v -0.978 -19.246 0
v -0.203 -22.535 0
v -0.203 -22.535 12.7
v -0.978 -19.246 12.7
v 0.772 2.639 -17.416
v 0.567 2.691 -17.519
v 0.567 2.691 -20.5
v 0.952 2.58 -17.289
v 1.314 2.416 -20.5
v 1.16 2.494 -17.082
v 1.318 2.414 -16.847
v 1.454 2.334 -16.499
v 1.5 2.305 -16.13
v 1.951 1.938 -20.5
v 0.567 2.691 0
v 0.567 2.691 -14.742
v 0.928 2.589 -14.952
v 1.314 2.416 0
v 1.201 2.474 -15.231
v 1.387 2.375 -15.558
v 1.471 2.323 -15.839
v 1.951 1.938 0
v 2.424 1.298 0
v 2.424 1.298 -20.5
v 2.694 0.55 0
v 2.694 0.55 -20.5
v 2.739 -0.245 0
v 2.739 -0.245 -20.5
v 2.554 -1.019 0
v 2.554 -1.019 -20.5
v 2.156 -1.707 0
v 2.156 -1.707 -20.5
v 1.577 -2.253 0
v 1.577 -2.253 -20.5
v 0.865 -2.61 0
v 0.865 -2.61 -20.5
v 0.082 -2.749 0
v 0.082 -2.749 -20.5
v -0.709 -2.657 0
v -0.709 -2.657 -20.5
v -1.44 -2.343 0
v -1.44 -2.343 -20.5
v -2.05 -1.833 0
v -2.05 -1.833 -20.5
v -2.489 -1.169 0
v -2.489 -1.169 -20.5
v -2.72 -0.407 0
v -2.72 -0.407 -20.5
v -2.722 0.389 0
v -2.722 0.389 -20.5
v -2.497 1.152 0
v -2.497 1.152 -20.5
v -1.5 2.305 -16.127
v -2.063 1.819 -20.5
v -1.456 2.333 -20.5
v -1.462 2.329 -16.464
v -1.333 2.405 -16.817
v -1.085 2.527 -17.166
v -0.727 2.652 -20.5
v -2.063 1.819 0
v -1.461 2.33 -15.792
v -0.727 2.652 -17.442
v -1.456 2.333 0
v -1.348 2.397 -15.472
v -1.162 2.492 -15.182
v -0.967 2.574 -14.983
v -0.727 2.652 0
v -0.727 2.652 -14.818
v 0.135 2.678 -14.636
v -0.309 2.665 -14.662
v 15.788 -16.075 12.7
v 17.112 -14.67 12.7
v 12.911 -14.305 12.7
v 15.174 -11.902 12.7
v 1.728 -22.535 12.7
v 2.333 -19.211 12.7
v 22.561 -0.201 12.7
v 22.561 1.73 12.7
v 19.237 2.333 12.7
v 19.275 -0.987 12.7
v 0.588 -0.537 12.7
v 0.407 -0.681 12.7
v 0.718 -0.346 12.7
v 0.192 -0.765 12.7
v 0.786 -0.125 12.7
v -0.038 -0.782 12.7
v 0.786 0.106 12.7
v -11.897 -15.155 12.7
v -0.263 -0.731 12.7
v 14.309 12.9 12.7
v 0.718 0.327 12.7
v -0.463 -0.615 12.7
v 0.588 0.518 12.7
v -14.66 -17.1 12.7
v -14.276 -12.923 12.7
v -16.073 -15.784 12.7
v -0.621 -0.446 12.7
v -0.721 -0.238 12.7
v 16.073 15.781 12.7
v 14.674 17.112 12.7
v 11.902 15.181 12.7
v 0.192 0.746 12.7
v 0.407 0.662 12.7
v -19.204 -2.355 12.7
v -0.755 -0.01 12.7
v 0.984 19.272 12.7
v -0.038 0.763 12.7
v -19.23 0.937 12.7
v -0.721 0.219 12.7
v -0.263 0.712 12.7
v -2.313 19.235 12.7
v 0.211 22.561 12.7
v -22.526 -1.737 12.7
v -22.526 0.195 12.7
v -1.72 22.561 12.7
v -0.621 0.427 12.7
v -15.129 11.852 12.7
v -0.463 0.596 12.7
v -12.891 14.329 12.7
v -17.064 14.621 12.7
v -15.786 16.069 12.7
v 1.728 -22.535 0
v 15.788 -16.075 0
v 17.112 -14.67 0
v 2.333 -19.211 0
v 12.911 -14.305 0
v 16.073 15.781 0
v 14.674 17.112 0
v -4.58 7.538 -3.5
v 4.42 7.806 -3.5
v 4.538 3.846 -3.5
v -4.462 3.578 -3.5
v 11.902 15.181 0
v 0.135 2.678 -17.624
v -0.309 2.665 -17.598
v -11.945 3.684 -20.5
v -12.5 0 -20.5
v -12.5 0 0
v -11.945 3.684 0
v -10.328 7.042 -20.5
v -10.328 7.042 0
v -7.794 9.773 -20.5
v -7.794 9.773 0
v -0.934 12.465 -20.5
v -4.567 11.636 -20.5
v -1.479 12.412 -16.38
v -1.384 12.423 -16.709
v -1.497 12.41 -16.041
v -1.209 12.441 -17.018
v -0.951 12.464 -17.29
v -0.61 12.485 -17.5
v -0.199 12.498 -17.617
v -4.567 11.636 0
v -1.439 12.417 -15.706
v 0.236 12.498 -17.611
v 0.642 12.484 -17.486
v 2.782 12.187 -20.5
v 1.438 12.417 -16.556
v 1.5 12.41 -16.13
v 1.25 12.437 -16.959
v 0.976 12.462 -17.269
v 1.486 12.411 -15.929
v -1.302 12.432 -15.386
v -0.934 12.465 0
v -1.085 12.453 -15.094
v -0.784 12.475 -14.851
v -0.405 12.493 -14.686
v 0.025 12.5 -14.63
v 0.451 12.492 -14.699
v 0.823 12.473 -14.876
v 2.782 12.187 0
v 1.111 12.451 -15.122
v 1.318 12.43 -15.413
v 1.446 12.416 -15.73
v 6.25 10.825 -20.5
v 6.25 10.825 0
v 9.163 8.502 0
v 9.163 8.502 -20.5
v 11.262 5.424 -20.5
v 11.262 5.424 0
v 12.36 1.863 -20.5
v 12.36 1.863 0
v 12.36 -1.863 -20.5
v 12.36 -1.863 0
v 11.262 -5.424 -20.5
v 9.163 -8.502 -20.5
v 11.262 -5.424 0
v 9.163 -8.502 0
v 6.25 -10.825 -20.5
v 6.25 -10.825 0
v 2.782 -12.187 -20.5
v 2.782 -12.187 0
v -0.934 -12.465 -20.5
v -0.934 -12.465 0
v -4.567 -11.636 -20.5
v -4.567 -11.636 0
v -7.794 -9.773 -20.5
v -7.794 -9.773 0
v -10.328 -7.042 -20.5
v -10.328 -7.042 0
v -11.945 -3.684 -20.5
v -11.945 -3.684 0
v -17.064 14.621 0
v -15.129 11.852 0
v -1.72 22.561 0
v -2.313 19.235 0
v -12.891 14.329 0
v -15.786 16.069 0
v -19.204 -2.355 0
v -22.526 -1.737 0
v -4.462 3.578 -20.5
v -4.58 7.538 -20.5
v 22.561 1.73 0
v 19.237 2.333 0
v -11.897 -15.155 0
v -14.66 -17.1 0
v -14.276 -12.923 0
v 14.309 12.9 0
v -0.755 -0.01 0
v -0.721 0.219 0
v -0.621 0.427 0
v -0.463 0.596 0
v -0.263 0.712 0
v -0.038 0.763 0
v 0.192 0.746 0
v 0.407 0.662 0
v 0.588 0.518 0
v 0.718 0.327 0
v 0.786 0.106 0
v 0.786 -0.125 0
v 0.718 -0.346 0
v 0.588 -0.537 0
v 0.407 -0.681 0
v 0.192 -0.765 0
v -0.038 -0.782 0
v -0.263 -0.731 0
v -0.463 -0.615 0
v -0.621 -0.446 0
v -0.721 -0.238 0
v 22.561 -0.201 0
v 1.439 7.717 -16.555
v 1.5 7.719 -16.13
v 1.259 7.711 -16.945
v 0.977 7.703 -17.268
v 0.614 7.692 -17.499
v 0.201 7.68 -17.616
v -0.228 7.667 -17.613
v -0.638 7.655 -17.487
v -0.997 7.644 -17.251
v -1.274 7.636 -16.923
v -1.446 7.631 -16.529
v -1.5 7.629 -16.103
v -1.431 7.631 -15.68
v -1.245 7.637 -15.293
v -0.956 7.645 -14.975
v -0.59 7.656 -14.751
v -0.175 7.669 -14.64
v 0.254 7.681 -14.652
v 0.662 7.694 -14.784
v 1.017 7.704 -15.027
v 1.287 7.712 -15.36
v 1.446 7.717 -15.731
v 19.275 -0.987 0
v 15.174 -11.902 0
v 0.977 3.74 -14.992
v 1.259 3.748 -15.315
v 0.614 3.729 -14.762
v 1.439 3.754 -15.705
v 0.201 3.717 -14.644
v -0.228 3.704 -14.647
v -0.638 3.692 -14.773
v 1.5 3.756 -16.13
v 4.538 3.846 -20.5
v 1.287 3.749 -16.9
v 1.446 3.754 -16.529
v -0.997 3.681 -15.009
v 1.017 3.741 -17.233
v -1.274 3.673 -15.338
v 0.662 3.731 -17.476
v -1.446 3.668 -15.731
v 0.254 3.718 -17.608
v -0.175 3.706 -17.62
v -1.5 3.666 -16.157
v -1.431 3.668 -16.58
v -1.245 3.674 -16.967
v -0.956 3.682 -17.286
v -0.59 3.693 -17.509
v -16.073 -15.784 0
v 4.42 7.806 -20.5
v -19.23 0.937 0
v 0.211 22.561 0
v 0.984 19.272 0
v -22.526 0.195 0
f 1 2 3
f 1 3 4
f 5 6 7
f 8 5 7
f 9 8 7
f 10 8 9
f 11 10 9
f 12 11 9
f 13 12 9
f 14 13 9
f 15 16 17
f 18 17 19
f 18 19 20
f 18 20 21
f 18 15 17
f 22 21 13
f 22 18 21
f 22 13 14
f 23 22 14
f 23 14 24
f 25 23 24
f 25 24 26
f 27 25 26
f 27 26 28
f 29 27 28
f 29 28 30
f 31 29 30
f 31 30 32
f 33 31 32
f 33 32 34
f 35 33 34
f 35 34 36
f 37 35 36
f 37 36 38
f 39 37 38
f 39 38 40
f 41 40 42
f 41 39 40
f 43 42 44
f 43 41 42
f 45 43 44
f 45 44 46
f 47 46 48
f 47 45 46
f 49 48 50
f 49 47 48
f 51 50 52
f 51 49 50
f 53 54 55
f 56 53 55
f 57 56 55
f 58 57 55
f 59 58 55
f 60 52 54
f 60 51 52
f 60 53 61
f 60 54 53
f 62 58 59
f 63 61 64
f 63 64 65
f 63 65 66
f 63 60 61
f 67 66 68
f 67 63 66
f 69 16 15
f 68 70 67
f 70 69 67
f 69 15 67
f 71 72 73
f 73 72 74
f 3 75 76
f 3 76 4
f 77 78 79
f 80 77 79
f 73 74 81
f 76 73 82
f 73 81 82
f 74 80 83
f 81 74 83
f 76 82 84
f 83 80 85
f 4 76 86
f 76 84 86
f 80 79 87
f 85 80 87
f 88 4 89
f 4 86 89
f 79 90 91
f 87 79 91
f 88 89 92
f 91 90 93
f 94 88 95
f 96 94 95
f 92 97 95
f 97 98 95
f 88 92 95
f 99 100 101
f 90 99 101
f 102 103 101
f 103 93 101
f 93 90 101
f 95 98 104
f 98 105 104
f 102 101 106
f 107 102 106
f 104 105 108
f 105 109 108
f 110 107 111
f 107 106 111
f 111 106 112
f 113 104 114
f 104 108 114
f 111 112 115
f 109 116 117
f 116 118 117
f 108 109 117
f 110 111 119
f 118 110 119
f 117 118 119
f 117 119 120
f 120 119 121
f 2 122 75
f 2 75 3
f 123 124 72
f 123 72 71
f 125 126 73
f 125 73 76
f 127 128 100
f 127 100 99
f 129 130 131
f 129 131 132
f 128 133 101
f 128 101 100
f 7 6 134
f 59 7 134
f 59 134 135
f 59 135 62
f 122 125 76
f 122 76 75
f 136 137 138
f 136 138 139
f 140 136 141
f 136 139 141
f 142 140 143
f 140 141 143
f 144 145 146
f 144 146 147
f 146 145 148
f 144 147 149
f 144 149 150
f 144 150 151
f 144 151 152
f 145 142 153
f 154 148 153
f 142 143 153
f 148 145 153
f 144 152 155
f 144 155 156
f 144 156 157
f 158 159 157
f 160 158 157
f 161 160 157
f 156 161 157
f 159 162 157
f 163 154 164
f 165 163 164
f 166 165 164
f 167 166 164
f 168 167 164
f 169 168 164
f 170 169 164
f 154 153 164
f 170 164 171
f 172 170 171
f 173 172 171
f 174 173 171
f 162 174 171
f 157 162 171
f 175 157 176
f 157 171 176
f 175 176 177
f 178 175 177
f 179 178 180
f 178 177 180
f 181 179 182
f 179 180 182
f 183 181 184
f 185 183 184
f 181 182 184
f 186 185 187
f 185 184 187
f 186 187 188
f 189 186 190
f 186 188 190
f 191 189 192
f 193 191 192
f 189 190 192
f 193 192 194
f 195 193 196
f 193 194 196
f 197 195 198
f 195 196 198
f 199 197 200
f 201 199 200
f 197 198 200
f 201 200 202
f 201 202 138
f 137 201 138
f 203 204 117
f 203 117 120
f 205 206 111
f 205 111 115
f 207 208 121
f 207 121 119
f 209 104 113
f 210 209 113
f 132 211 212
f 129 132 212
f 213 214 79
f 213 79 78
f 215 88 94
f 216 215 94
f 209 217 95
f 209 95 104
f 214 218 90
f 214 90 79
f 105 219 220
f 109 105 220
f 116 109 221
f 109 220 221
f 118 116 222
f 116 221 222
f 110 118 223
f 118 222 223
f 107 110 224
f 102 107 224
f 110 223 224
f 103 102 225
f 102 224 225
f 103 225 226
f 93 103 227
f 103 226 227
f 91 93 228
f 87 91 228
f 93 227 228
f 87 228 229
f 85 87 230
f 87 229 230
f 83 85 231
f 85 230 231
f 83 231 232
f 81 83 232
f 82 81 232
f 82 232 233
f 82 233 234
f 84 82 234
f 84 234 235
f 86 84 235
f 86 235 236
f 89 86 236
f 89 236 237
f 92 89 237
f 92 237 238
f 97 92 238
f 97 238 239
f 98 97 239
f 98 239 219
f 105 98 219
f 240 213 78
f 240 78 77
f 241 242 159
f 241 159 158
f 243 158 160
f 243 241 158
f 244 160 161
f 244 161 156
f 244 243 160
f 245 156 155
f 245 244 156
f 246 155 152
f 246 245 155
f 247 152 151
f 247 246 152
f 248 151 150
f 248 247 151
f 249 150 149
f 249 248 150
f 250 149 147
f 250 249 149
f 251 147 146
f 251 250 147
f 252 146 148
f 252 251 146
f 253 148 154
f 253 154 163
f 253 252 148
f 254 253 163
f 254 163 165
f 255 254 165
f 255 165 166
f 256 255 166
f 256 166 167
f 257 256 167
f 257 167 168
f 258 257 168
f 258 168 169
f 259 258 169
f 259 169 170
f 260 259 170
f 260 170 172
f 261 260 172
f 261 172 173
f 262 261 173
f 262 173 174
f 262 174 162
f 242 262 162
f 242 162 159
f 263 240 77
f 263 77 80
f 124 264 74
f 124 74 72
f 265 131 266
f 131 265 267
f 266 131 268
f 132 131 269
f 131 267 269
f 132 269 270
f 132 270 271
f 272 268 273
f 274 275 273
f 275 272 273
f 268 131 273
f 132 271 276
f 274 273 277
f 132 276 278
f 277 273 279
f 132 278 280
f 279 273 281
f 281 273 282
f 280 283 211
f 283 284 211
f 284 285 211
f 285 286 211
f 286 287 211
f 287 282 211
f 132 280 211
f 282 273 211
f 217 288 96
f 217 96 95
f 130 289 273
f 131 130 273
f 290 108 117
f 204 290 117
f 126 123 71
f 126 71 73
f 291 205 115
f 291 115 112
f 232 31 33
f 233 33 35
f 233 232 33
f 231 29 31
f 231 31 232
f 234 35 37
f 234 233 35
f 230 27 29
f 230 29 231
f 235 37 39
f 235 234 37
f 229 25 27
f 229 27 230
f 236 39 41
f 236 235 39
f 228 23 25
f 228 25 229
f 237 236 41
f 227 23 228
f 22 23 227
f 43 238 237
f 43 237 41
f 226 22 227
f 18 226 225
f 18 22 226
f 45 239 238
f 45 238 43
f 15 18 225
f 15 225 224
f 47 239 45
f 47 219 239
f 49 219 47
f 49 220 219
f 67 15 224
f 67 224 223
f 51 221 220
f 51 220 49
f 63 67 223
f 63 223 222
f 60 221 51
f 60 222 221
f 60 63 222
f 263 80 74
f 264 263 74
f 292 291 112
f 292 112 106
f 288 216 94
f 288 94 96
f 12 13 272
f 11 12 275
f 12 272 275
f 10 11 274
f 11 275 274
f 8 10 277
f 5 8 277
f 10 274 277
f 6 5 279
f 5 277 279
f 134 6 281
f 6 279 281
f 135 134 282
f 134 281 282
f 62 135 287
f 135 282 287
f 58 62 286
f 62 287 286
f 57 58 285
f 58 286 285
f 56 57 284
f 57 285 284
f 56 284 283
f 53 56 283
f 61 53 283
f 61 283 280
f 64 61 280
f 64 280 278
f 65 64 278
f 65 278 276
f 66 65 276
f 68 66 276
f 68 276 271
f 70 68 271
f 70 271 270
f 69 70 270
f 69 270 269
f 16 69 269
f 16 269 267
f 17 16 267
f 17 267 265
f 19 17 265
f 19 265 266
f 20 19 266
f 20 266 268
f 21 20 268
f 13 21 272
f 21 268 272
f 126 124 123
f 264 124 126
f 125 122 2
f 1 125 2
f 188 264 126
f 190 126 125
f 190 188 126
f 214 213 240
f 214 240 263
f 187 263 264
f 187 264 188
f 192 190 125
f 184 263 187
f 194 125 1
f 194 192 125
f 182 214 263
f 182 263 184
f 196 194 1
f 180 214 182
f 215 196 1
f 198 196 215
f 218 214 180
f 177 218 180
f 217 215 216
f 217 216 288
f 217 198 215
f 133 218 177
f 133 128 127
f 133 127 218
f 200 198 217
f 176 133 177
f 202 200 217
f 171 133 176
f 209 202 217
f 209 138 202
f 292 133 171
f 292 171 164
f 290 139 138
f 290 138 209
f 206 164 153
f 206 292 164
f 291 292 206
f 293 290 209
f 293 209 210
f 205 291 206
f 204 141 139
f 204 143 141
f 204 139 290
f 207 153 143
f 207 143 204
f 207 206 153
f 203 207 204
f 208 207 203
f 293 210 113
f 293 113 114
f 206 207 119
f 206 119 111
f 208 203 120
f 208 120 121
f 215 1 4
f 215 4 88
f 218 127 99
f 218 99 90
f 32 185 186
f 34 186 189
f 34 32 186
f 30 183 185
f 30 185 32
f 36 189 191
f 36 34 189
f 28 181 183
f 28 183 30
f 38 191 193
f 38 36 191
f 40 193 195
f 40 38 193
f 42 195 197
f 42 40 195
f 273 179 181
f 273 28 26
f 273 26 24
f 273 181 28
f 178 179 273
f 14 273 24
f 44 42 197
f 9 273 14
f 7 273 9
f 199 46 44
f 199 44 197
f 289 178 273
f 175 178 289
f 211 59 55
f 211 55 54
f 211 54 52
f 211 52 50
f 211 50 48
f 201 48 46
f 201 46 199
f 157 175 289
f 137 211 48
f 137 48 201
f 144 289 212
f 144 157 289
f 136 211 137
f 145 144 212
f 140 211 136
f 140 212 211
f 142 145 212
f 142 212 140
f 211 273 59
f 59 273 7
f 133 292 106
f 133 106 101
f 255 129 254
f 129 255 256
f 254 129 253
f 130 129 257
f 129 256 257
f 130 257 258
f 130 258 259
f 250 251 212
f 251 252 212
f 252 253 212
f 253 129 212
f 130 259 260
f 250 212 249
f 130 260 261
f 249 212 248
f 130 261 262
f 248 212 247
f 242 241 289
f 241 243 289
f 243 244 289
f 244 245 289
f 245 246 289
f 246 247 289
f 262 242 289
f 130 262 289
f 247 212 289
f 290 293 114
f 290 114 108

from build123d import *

# Parameters (mm, degrees)
BOSS_EXTRUDE1_DEPTH     = 12.7
CUT_EXTRUDE1_REACH      = 14.7
SKETCH2_R               = 0.775
SKETCH4_R               = 12.5
SKETCH4_R_2             = 2.75
BOSS_EXTRUDE3_DEPTH     = 20.5
BOSS_EXTRUDE4_DEPTH     = 20.5
SKETCH5_R               = 1.5
CUT_EXTRUDE2_DEPTH      = 12
CUT_EXTRUDE2_DEPTH_BACK = 2
CUT_EXTRUDE3_DEPTH      = 17


with BuildPart() as part:
    # Sketch1 → Boss-Extrude1 (new body)
    with BuildSketch(Plane(origin=(0, 0, 0), x_dir=(-1, 0, 0), z_dir=(0, 0, -1))):
        Polygon((22.52557458, -1.736588639), (22.52557458, 0.194536921), (19.229808022, 0.93665661), (15.128723263, 11.851737372), (17.063649078, 14.621011813), (15.786423571, 16.069438867), (12.890863827, 14.329165151), (2.313040546, 19.235032954), (1.719665356, 22.560799741), (-0.211460204, 22.560799741), (-0.98374926, 19.271971918), (-11.902473648, 15.180597821), (-14.673902719, 17.112436257), (-16.073066924, 15.781427071), (-14.308800518, 12.900423272), (-19.236913758, 2.332945609), (-22.560976284, 1.730096406), (-22.560976284, -0.201029153), (-19.275488766, -0.987407309), (-15.174404006, -11.902488071), (-17.112216048, -14.669743631), (-15.788139908, -16.075470597), (-12.910837913, -14.305173427), (-2.333014633, -19.21104123), (-1.727718406, -22.534659035), (0.203407153, -22.534659035), (0.978499423, -19.246490729), (11.89722381, -15.155116632), (14.659649692, -17.099807376), (16.072878525, -15.783741196), (14.276312796, -12.922767512), (19.204426036, -2.355289849), align=None)
    extrude(amount=-BOSS_EXTRUDE1_DEPTH)

    # Sketch2 → Cut-Extrude1 (cut, up to next)
    with BuildSketch(Plane(origin=(0, 0, 0), x_dir=(-1, 0, 0), z_dir=(0, 0, -1)), mode=Mode.PRIVATE) as cut_extrude1_sk1:
        with Locations((-0.019773646, -0.00956531)):
            Circle(SKETCH2_R)
    cut_extrude1_tool1 = extrude(cut_extrude1_sk1.sketch, amount=-CUT_EXTRUDE1_REACH, mode=Mode.PRIVATE) & part.part
    add(cut_extrude1_tool1.solids().sort_by_distance((0.019774, -0.009565, 0))[0], mode=Mode.SUBTRACT)

    # Sketch4 → Boss-Extrude3 (add)
    with BuildSketch(Plane(origin=(0, 0, 0), x_dir=(-1, 0, 0), z_dir=(0, 0, -1))):
        Circle(SKETCH4_R)
        Circle(SKETCH4_R_2, mode=Mode.SUBTRACT)
    extrude(amount=BOSS_EXTRUDE3_DEPTH)

    # Sketch4<4> → Boss-Extrude4 (add)
    with BuildSketch(Plane(origin=(0, 0, 0), x_dir=(-1, 0, 0), z_dir=(0, 0, -1))):
        with BuildLine():
            Line((-0.567488363, 2.690809722), (0.726565511, 2.652282518))
            ThreePointArc((0.726565511, 2.652282518), (0.081838079, 2.748782008), (-0.567488363, 2.690809722))
        make_face()
    extrude(amount=BOSS_EXTRUDE4_DEPTH)

    # Sketch5 → Cut-Extrude2 (cut, two sides)
    with BuildSketch(Plane(origin=(0, 4, 0), x_dir=(1, 0, 0), z_dir=(0, 1, 0))) as cut_extrude2_sk:
        with Locations((0, 16.130068411)):
            Circle(SKETCH5_R)
    extrude(amount=CUT_EXTRUDE2_DEPTH, mode=Mode.SUBTRACT)
    extrude(cut_extrude2_sk.sketch, amount=-CUT_EXTRUDE2_DEPTH_BACK, mode=Mode.SUBTRACT)

    # Sketch6 → Cut-Extrude3 (cut)
    with BuildSketch(Plane(origin=(0, 0, -20.5), x_dir=(-1, 0, 0), z_dir=(0, 0, -1))):
        Polygon((4.579538574, 7.537569925), (-4.420461426, 7.805522315), (-4.538346431, 3.845994095), (4.461653569, 3.578041705), align=None)
    extrude(amount=-CUT_EXTRUDE3_DEPTH, mode=Mode.SUBTRACT)


solid = part.part
